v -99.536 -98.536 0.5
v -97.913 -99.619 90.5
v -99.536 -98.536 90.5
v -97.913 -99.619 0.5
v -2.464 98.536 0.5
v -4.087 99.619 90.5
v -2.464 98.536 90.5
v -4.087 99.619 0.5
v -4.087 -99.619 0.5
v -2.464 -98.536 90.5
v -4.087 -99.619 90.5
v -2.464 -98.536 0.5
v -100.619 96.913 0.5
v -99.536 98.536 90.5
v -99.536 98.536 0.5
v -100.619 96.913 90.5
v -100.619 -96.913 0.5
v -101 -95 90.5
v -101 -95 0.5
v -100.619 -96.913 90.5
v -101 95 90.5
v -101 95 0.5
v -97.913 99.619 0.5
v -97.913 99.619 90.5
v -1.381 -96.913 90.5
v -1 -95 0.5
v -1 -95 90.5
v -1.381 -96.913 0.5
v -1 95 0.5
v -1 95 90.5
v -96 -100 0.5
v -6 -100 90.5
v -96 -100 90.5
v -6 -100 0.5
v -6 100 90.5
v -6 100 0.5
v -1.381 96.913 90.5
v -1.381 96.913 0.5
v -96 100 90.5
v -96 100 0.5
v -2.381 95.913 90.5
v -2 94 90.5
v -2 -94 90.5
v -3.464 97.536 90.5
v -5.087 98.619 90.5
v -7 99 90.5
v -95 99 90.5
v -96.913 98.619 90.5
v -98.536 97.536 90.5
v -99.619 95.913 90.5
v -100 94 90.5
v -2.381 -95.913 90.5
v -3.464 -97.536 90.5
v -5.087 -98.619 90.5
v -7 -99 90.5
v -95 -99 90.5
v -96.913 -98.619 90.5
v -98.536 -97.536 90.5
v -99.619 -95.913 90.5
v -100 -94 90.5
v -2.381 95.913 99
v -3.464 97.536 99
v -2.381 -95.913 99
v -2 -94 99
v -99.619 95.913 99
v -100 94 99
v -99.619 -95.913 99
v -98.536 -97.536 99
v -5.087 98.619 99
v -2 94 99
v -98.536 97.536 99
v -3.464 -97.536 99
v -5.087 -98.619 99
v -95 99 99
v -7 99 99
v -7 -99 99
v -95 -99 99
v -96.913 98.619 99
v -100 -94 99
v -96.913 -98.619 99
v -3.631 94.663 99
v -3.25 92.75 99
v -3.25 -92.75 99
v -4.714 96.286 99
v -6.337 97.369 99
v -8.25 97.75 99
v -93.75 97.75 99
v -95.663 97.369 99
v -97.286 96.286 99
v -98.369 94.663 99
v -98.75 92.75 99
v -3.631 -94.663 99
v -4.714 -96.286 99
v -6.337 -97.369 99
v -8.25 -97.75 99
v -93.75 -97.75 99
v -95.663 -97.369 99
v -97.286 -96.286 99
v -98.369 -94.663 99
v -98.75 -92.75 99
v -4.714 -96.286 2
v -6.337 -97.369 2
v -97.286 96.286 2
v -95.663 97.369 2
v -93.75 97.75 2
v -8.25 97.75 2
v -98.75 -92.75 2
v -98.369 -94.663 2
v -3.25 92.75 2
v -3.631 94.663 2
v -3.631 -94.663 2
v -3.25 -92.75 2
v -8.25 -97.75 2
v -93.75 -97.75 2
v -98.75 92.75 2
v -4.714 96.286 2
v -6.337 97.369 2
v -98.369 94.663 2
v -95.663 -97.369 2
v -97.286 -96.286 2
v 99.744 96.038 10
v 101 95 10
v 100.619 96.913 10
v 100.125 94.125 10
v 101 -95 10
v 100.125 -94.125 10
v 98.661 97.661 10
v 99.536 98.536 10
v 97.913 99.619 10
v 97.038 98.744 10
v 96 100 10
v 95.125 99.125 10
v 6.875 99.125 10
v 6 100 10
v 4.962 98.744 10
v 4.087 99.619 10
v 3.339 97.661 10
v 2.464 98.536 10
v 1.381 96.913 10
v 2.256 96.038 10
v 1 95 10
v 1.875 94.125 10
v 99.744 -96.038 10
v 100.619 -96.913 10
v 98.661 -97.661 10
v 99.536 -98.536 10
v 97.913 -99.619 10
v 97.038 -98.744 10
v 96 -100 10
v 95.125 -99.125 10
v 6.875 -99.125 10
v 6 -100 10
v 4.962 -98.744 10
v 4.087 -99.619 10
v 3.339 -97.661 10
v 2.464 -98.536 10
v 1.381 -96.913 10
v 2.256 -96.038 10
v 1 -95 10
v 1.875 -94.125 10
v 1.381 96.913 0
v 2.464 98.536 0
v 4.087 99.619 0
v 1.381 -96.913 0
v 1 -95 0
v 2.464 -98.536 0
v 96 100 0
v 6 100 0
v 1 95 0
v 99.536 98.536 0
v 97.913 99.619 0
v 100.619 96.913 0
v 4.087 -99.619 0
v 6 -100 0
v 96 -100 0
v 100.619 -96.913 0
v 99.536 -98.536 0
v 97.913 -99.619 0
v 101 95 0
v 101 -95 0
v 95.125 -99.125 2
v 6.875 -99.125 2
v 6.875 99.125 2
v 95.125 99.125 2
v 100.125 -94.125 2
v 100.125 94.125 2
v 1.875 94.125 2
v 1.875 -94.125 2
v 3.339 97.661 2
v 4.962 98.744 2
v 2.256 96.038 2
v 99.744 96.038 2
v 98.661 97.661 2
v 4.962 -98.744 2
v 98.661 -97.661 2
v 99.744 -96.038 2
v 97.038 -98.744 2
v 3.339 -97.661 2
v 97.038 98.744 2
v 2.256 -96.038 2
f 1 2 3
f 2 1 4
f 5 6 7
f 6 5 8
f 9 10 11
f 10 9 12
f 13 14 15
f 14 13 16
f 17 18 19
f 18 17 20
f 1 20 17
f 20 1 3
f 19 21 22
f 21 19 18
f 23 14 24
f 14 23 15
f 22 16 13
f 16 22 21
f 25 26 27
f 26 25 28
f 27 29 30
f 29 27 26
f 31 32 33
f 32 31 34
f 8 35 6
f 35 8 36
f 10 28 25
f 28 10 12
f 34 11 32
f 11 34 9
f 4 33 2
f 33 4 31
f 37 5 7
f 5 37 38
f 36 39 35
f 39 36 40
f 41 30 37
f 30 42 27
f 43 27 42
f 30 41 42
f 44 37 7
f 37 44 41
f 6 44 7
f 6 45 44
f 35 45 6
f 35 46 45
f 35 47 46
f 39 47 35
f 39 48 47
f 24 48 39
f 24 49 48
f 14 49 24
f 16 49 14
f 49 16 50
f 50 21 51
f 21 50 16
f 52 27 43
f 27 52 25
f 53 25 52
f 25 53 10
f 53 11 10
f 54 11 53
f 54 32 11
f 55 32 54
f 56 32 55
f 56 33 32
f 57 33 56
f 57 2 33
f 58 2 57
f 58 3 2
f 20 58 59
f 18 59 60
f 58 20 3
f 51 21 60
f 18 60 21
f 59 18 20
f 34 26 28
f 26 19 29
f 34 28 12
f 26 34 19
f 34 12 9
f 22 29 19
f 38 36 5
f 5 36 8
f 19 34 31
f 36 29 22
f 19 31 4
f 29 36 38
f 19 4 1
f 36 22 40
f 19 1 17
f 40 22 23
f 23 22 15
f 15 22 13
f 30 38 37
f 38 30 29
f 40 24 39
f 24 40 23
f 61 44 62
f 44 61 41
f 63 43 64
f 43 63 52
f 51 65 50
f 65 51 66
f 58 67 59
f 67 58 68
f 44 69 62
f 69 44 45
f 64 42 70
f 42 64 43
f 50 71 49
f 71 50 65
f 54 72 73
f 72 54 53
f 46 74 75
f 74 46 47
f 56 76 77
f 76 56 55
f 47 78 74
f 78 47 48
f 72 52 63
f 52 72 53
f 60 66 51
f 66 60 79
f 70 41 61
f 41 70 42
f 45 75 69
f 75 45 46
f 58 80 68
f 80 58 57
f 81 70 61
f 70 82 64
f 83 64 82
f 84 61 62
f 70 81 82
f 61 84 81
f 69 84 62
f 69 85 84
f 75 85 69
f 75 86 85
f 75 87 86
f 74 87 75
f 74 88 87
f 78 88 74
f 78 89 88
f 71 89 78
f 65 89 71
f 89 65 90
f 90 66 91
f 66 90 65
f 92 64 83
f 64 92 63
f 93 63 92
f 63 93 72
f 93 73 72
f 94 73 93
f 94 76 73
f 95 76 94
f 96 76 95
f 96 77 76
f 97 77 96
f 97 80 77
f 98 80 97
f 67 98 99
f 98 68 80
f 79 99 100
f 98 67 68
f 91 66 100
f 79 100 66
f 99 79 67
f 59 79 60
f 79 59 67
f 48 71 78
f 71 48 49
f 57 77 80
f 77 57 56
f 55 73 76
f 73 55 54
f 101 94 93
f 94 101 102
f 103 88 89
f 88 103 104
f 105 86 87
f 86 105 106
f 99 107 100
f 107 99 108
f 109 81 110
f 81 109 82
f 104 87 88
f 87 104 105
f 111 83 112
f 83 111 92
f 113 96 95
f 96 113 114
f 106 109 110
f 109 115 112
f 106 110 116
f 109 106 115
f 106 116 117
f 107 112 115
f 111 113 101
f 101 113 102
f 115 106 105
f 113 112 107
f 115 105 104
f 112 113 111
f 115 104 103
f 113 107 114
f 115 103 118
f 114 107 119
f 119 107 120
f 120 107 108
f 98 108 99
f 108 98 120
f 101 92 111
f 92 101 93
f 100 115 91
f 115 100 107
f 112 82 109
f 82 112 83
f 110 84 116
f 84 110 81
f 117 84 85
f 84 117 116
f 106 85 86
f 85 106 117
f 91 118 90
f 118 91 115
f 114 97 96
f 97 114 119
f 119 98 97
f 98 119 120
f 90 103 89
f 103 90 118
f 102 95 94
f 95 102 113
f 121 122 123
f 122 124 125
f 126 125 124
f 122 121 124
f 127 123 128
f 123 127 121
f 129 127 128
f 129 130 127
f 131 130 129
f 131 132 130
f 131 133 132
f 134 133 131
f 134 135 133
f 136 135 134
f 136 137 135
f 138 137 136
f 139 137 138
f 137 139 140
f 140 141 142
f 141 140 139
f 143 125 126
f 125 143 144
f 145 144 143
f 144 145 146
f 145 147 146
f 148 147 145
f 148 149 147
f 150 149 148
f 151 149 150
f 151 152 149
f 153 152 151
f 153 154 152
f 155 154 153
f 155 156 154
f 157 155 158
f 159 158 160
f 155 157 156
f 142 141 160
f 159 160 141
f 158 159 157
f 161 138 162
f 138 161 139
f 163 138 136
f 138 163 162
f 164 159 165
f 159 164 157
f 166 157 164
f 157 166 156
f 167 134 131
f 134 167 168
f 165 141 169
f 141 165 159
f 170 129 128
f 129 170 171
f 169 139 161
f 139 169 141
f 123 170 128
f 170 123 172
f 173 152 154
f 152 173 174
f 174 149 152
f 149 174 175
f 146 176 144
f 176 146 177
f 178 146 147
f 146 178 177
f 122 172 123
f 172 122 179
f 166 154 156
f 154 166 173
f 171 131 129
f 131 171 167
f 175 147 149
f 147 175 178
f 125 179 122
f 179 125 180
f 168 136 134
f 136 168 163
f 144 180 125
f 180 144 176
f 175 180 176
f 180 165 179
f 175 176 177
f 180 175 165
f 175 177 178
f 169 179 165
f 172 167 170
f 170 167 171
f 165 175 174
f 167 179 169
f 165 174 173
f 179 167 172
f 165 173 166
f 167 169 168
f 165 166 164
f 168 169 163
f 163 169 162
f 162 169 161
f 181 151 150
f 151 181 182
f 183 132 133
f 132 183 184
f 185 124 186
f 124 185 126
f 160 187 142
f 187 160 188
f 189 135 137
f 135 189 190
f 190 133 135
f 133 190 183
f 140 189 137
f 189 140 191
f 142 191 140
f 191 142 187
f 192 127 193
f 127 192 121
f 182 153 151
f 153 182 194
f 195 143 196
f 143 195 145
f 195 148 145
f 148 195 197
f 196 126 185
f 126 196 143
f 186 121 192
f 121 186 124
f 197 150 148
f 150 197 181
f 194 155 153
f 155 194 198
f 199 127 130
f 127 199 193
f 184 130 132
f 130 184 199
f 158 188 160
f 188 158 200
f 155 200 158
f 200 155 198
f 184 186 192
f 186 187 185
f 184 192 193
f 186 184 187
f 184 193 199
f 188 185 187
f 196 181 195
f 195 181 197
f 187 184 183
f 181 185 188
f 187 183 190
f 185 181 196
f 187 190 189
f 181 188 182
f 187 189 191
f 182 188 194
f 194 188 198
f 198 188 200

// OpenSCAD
// [FL_INDEX: keywords="openscad, 3d_parametric, Yet_another_customizable_box___project_enclosure, csg_solid" | COT="Parametric OpenSCAD design from 3DCodeverse"]
// Title: Yet another customizable box / project enclosure.

// http://www.thingiverse.com/thing:213934

// ================ variables

//CUSTOMIZER VARIABLES

/* [Main] */

// in mm
x_width=100;

// in mm
y_width=200;

// in mm
height=50;

// Wall thickness in mm
thickness=2; // [1:10]

// Corner roundover in mm (0=sharp corner)
radius=5; // [0:50]

// Generate the box
do_box=1; // [0:no,1:yes]

// Generate a lid
do_lid=1; // [0:no,1:yes]

// height in mm
lid_thickness=5;

//CUSTOMIZER VARIABLES END

// Screw pilot hole size
screw_pilot=1.125*1;

// Screw hole size
screw_hole=2.5*1;

// Whether you want the screw countersunk
screw_countersink=0*1;

// =============== calculated variables
lid_height=min(height/4,lid_thickness);
corner_radius=min(radius,x_width/2,y_width/2);
xadj=x_width-(corner_radius*2);
yadj=y_width-(corner_radius*2);
snugfit=0.5/2;

// =============== program

// ---- The box
if(do_box==1) translate([-((x_width/2+1)*do_lid),0,height/2-thickness]) difference() {

union() {
minkowski() // main body
{
 cube([xadj,yadj,height-lid_height],center=true);
 cylinder(r=corner_radius,h=height-lid_height);
}

translate([0,0,lid_height-thickness]) minkowski() // main body overlap
{
 cube([xadj-thickness,yadj-thickness,height-(thickness*2)],center=true);
 cylinder(r=corner_radius,h=height);
}
}

translate([0,0,thickness*2]) minkowski() // inside area
{
 cube([xadj-((thickness+snugfit)*2),yadj-((thickness+snugfit)*2),height],center=true);
 cylinder(r=corner_radius,h=height);
}

};

// ---- The lid
if(do_lid==1) translate([(x_width/2+1)*do_box,0,lid_height/2]) {

difference() {
minkowski() // main body
{
 cube([xadj,yadj,lid_height],center=true);
 cylinder(r=corner_radius,h=lid_height);
}

translate([0,0,thickness]) minkowski() // inside area
{
 cube([xadj-(thickness-snugfit),yadj-(thickness-snugfit),lid_height],center=true);
 cylinder(r=corner_radius,h=lid_height);
}
}

};
